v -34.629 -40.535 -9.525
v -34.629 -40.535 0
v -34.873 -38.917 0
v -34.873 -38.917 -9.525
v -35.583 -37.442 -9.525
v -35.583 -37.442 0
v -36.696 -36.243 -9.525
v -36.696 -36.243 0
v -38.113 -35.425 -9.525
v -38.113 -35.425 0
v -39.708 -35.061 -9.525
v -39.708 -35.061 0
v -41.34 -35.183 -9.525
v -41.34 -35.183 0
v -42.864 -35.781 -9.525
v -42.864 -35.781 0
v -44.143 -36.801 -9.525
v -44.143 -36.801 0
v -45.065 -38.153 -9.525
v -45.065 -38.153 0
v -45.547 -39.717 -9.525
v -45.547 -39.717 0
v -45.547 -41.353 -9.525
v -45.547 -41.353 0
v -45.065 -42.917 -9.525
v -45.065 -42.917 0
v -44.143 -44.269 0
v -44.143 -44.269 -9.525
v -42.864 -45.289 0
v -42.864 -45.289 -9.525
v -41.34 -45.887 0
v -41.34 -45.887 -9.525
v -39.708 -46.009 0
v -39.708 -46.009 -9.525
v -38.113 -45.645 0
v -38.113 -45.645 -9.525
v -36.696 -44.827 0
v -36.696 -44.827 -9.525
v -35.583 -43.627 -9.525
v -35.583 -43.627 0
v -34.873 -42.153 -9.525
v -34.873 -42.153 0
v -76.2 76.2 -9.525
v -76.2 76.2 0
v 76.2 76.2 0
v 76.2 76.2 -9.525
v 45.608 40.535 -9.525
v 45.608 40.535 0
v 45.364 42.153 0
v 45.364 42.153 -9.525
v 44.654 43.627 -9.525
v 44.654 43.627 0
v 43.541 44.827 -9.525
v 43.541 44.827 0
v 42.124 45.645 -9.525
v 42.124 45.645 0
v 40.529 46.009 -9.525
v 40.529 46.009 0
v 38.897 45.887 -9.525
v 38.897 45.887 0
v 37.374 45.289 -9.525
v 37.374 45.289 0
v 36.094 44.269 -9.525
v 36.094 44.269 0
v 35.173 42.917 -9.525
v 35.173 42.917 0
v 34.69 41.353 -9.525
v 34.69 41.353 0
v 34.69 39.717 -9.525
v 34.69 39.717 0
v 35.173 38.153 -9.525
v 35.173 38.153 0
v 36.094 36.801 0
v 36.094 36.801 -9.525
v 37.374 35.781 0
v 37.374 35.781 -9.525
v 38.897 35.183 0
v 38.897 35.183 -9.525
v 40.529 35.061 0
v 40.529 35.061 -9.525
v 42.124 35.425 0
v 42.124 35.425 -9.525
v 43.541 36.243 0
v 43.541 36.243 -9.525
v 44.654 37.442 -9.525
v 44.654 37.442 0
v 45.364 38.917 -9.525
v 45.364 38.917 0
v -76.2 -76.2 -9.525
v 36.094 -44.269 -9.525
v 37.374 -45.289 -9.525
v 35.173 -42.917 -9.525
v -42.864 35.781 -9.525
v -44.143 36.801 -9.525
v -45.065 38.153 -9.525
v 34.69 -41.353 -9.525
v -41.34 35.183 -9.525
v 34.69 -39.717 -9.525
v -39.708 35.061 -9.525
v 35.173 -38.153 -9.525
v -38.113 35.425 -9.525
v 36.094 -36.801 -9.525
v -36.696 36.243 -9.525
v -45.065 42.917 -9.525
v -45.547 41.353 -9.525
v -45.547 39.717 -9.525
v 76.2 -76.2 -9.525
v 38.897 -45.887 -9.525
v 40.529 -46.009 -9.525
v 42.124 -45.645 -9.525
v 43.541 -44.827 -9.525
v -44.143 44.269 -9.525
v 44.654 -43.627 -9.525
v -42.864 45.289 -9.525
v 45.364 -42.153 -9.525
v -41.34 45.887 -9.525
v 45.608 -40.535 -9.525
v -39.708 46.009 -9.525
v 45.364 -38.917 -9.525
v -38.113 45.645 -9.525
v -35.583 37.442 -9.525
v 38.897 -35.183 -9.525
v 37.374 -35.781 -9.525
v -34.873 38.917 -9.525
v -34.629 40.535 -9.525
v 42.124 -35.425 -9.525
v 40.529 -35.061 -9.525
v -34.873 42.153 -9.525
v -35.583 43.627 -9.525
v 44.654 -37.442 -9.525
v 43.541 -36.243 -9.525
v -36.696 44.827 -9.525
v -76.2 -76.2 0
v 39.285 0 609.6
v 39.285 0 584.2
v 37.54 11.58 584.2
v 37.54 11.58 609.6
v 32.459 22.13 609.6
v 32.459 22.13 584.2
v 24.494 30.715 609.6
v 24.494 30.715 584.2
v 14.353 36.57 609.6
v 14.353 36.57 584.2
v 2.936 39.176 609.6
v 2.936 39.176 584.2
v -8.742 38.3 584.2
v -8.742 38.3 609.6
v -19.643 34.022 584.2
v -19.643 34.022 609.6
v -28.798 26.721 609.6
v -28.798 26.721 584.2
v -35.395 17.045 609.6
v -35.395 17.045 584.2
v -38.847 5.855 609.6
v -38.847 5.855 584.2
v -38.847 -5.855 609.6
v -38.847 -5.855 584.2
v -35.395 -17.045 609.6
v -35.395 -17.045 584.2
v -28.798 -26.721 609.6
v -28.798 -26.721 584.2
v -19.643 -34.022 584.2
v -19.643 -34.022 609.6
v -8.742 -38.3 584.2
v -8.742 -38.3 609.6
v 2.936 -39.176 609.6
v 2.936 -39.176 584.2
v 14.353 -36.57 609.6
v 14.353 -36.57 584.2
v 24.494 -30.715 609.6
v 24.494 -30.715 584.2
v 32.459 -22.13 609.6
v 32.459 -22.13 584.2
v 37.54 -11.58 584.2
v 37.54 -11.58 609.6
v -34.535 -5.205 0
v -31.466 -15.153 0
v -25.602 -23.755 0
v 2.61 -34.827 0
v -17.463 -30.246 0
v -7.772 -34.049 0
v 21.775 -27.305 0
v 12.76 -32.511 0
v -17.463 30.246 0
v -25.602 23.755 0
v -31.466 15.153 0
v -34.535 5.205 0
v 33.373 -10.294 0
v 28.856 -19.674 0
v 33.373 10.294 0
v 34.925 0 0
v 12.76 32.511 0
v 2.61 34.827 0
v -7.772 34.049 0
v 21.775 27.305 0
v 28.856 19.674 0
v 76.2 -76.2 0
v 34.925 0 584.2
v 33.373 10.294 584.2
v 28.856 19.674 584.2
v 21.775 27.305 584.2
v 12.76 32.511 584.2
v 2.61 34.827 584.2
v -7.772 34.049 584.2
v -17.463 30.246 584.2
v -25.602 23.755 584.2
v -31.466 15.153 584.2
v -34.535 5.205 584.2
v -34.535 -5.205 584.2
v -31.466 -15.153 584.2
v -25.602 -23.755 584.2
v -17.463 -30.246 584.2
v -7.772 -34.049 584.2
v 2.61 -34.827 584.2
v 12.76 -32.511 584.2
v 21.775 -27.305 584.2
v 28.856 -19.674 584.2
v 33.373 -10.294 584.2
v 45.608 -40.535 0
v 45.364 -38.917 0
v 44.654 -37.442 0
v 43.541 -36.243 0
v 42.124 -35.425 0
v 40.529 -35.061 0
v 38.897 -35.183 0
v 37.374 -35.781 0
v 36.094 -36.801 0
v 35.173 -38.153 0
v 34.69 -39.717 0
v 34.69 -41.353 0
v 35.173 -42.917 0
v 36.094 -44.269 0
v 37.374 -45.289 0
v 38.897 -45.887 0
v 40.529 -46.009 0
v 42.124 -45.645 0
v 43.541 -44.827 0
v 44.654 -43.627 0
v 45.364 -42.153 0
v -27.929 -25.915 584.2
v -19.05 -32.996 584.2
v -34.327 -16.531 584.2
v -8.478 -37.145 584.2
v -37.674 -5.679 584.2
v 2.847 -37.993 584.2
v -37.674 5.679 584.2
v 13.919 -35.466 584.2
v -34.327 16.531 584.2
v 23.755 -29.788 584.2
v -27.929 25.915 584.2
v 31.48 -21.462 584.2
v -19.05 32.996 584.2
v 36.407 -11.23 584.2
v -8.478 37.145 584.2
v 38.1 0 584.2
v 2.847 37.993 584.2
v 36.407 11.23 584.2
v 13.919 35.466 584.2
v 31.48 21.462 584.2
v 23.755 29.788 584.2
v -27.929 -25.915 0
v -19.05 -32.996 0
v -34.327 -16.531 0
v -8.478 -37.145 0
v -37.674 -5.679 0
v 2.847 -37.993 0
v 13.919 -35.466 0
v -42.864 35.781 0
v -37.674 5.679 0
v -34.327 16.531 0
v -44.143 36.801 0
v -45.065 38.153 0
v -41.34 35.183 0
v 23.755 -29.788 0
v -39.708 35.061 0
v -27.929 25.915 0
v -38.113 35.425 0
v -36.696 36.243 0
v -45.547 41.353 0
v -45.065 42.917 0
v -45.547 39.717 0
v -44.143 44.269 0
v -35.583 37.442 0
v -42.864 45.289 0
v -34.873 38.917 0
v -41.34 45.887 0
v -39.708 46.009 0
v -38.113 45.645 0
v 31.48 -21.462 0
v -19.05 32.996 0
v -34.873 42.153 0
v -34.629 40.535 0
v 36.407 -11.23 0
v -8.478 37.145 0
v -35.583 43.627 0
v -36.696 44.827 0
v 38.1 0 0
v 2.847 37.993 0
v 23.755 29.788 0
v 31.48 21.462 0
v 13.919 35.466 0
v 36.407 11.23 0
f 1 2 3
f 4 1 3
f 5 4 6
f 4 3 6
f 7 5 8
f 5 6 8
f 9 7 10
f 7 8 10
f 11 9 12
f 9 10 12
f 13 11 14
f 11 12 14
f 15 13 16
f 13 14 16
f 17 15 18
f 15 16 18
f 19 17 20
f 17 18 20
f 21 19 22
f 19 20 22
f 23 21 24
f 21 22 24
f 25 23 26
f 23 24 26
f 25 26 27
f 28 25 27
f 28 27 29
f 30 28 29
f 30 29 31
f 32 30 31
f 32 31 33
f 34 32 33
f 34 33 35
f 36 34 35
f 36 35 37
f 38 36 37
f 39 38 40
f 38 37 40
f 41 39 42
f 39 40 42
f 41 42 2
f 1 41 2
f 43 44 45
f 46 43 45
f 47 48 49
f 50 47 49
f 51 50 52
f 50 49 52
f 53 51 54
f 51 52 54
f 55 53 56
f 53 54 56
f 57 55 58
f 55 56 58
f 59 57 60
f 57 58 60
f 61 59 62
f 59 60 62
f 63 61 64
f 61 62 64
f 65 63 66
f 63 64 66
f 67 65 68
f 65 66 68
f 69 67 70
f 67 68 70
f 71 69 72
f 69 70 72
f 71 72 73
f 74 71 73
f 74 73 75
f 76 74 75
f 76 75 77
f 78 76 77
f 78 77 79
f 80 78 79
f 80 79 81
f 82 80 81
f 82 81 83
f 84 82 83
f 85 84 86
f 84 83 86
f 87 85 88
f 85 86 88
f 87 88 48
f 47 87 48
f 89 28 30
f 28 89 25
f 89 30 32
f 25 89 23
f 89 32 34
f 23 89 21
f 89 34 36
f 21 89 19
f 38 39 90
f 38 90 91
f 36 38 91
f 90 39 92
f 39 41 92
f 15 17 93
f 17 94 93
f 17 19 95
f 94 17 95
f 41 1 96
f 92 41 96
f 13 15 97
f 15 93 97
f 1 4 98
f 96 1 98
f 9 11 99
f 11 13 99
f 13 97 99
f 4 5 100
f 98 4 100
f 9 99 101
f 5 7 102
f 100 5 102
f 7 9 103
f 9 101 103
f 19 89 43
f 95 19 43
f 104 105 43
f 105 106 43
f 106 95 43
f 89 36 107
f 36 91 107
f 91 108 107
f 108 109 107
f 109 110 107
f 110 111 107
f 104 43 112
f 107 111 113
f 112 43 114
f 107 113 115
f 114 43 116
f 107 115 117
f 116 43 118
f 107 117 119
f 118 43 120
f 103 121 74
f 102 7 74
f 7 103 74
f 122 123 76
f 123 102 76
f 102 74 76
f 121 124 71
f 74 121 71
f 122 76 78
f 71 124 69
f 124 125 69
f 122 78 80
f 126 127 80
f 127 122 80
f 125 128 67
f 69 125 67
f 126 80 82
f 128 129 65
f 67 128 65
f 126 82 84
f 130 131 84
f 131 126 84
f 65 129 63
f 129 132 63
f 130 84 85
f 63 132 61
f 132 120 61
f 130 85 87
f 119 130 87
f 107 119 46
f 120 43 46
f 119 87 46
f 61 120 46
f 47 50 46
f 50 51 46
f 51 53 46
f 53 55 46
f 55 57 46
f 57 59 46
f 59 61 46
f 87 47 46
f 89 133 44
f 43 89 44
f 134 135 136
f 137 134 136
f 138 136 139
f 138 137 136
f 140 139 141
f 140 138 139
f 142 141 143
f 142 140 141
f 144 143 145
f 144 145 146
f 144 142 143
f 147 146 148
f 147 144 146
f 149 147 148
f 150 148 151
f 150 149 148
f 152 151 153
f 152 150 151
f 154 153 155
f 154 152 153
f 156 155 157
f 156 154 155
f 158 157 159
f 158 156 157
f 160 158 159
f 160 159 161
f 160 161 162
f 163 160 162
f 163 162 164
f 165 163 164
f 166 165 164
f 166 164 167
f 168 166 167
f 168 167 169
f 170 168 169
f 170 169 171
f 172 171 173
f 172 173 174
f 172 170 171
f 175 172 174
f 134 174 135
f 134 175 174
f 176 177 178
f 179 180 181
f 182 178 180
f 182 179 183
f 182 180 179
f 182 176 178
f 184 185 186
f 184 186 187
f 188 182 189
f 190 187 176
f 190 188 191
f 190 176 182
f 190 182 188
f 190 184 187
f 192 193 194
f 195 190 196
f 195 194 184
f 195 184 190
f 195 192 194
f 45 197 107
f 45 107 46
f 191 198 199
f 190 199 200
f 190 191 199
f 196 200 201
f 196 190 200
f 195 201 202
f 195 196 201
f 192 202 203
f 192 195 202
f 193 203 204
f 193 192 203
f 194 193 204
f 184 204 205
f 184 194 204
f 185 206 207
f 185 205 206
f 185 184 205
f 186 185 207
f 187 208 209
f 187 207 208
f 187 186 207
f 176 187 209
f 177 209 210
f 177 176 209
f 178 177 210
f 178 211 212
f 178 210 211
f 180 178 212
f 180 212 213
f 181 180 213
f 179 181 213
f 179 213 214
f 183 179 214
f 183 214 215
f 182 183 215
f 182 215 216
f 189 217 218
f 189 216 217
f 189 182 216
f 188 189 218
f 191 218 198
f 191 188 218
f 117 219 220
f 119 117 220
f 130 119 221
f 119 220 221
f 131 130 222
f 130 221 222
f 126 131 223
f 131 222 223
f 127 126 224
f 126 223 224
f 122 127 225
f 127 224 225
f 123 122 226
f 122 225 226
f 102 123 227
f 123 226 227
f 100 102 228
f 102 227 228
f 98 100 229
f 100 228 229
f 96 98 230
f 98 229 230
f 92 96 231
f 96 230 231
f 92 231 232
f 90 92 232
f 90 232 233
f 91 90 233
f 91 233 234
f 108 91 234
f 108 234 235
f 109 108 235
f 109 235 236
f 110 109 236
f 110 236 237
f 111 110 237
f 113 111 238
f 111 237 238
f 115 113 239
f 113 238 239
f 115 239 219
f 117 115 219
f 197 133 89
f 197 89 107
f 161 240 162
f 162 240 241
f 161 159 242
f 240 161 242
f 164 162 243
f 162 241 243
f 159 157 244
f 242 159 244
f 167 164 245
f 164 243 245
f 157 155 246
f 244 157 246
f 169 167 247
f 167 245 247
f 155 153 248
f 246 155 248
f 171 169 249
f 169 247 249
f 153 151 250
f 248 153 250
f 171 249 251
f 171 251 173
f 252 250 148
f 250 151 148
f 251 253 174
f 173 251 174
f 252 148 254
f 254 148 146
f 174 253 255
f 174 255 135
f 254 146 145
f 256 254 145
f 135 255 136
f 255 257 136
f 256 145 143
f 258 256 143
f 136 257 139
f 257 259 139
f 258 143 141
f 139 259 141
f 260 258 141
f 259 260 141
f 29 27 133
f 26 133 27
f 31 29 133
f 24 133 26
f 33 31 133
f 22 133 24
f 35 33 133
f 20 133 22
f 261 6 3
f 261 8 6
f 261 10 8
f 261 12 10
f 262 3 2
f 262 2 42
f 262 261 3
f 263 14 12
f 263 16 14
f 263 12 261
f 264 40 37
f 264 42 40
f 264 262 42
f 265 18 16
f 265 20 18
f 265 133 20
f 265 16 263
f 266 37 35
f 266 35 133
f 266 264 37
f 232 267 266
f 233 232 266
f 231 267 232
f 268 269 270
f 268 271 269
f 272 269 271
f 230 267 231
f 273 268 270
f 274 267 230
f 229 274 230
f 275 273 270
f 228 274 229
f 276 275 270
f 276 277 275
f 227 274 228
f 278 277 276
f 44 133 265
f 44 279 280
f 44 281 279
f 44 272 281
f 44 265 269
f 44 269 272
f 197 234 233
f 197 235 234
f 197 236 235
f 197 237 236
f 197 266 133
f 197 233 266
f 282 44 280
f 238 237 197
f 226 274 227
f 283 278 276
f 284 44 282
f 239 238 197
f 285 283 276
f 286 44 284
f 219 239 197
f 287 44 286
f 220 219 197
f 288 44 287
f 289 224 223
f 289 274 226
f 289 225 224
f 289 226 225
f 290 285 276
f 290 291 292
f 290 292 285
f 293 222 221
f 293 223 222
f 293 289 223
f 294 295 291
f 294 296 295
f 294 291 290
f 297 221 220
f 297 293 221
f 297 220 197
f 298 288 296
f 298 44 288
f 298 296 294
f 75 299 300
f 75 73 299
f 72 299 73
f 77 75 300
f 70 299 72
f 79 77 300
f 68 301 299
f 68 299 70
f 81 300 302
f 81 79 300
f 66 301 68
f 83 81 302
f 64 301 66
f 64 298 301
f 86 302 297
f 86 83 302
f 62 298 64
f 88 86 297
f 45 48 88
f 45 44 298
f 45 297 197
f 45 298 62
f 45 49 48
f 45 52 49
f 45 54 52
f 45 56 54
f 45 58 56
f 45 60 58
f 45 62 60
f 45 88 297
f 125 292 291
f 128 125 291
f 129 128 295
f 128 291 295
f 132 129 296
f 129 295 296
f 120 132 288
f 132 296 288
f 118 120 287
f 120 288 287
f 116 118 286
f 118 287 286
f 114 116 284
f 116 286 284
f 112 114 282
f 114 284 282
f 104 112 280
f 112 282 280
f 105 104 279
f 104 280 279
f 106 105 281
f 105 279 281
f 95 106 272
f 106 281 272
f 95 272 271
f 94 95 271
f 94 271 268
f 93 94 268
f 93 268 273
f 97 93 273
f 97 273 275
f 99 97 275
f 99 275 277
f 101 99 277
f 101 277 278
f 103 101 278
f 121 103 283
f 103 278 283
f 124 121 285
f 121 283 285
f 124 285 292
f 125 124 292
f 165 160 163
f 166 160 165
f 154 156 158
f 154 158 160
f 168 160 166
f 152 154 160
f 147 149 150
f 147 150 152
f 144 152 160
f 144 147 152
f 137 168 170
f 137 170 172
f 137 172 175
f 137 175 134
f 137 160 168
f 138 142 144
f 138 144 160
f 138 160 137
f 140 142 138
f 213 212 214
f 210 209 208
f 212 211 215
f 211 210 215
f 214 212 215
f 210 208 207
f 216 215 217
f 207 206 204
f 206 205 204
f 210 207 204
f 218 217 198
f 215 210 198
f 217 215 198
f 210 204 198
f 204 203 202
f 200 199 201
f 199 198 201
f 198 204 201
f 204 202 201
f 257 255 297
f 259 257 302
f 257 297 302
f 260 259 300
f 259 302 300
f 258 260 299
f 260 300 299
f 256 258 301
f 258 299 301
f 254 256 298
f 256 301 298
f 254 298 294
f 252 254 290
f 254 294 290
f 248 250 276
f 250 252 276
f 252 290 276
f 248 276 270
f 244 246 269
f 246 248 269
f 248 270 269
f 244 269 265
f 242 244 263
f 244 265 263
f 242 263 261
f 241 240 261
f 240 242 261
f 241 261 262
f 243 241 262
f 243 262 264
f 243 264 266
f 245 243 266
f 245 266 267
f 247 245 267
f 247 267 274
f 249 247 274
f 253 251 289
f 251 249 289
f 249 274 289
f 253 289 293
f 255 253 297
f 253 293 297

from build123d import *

# Parameters (mm, degrees)
F0_R     = 38.1
F0_R_2   = 34.925
F1_DEPTH = 609.6
F2_W     = 152.4
F2_H     = 152.4
F2_R     = 5.489771
F3_DEPTH = 9.525
F4_R     = 39.285427
F5_DEPTH = 25.4


with BuildPart() as f1:
    # F0 (on Top) → F1 (new body)
    with BuildSketch(Plane.XY):
        Circle(F0_R)
        Circle(F0_R_2, mode=Mode.SUBTRACT)
    extrude(amount=F1_DEPTH)

    # F2 (on Top) → F3 (join)
    with BuildSketch(Plane.XY):
        Rectangle(F2_W, F2_H)
        with Locations((-40.11862, -40.534951)):
            Circle(F2_R, mode=Mode.SUBTRACT)
        with Locations((40.11862, -40.534951)):
            Circle(F2_R, mode=Mode.SUBTRACT)
        with Locations((-40.11862, 40.534951)):
            Circle(F2_R, mode=Mode.SUBTRACT)
        with Locations((40.11862, 40.534951)):
            Circle(F2_R, mode=Mode.SUBTRACT)
    extrude(amount=-F3_DEPTH)

    # F4 (on face) → F5 (join)
    with BuildSketch(Plane.XY.offset(609.6)):
        Circle(F4_R)
    extrude(amount=-F5_DEPTH)


solid = f1.part
